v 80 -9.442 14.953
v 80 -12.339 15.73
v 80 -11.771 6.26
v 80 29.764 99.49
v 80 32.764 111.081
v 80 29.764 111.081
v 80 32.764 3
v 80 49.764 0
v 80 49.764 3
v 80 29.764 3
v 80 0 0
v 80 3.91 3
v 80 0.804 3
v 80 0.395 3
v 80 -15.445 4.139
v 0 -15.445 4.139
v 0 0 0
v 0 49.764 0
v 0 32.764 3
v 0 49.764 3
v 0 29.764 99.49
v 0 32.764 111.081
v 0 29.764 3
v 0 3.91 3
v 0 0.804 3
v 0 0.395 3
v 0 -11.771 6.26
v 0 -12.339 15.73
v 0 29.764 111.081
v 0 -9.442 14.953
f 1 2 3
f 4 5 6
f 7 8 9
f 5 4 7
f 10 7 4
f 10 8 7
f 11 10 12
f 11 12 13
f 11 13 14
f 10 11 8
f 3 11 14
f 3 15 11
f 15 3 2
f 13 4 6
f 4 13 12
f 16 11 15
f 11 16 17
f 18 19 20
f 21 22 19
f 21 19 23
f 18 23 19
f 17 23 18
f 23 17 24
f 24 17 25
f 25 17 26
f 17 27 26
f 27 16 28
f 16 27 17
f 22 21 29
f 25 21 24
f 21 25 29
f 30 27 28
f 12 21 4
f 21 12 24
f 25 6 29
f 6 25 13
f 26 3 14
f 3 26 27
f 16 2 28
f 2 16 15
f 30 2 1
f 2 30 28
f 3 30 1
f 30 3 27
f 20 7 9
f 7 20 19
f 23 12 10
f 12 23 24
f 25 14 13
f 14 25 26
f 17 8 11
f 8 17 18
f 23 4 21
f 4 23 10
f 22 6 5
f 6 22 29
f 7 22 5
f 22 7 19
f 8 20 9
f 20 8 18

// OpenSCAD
//preview[view:south west, tilt:top diagonal]
stand_width = 80; //[20:100]
paper_thickness = 16; //[5:50]
paper_height = 115; //[50:300]
holdback_height = 12; //[5:50]
wall_thickness = 3; //[1:10]
fuzz = 0.01; 
//Paper angle
rotate_angle = 15; //[0:85]
rotate_a = -rotate_angle;
//extra part on the back to prevent tipping over
tail_length=20; //[0:100]
//IMPORTANT set this when exporting to STL (to print on its side !! supportless)
print_mode = "preview"; //[preview,print]

start();

module start(){
	if (print_mode == "preview"){
		difference(){
 			ding();
			//maak onderkant plat
			translate([-300,-300,-600]) cube([600,600,600]);
		}
	} else {
		rotate(-90,[0,1,0]){
			difference(){
 				ding();
				//maak onderkant plat
				translate([-300,-300,-600]) cube([600,600,600]);
			}
		}
	}
}

module ding(){
	rotate(rotate_a,[1,0,0]) a();
	b();
	c();
}

module a(){
	//back, papier leunt hier tegenaan
	cube([stand_width, wall_thickness,paper_height]);
	//bakje, papier staat hierop
	translate([0,-paper_thickness+fuzz,0]) cube([stand_width, paper_thickness, wall_thickness]);
	//holdback, dit houd tegen
	translate([0,-paper_thickness+fuzz,0]) cube([stand_width, wall_thickness,holdback_height]);
}

module b(){
	//onderkant
	cube([stand_width,sin(rotate_a*-1)*paper_height,wall_thickness]);
	//achterkant
	translate([0,sin(rotate_a*-1)*paper_height,0]) cube([stand_width,wall_thickness,cos(rotate_a*1)*paper_height]);
}

module c(){
	cube([stand_width,sin(rotate_a*-1)*paper_height+tail_length,wall_thickness]);
}
